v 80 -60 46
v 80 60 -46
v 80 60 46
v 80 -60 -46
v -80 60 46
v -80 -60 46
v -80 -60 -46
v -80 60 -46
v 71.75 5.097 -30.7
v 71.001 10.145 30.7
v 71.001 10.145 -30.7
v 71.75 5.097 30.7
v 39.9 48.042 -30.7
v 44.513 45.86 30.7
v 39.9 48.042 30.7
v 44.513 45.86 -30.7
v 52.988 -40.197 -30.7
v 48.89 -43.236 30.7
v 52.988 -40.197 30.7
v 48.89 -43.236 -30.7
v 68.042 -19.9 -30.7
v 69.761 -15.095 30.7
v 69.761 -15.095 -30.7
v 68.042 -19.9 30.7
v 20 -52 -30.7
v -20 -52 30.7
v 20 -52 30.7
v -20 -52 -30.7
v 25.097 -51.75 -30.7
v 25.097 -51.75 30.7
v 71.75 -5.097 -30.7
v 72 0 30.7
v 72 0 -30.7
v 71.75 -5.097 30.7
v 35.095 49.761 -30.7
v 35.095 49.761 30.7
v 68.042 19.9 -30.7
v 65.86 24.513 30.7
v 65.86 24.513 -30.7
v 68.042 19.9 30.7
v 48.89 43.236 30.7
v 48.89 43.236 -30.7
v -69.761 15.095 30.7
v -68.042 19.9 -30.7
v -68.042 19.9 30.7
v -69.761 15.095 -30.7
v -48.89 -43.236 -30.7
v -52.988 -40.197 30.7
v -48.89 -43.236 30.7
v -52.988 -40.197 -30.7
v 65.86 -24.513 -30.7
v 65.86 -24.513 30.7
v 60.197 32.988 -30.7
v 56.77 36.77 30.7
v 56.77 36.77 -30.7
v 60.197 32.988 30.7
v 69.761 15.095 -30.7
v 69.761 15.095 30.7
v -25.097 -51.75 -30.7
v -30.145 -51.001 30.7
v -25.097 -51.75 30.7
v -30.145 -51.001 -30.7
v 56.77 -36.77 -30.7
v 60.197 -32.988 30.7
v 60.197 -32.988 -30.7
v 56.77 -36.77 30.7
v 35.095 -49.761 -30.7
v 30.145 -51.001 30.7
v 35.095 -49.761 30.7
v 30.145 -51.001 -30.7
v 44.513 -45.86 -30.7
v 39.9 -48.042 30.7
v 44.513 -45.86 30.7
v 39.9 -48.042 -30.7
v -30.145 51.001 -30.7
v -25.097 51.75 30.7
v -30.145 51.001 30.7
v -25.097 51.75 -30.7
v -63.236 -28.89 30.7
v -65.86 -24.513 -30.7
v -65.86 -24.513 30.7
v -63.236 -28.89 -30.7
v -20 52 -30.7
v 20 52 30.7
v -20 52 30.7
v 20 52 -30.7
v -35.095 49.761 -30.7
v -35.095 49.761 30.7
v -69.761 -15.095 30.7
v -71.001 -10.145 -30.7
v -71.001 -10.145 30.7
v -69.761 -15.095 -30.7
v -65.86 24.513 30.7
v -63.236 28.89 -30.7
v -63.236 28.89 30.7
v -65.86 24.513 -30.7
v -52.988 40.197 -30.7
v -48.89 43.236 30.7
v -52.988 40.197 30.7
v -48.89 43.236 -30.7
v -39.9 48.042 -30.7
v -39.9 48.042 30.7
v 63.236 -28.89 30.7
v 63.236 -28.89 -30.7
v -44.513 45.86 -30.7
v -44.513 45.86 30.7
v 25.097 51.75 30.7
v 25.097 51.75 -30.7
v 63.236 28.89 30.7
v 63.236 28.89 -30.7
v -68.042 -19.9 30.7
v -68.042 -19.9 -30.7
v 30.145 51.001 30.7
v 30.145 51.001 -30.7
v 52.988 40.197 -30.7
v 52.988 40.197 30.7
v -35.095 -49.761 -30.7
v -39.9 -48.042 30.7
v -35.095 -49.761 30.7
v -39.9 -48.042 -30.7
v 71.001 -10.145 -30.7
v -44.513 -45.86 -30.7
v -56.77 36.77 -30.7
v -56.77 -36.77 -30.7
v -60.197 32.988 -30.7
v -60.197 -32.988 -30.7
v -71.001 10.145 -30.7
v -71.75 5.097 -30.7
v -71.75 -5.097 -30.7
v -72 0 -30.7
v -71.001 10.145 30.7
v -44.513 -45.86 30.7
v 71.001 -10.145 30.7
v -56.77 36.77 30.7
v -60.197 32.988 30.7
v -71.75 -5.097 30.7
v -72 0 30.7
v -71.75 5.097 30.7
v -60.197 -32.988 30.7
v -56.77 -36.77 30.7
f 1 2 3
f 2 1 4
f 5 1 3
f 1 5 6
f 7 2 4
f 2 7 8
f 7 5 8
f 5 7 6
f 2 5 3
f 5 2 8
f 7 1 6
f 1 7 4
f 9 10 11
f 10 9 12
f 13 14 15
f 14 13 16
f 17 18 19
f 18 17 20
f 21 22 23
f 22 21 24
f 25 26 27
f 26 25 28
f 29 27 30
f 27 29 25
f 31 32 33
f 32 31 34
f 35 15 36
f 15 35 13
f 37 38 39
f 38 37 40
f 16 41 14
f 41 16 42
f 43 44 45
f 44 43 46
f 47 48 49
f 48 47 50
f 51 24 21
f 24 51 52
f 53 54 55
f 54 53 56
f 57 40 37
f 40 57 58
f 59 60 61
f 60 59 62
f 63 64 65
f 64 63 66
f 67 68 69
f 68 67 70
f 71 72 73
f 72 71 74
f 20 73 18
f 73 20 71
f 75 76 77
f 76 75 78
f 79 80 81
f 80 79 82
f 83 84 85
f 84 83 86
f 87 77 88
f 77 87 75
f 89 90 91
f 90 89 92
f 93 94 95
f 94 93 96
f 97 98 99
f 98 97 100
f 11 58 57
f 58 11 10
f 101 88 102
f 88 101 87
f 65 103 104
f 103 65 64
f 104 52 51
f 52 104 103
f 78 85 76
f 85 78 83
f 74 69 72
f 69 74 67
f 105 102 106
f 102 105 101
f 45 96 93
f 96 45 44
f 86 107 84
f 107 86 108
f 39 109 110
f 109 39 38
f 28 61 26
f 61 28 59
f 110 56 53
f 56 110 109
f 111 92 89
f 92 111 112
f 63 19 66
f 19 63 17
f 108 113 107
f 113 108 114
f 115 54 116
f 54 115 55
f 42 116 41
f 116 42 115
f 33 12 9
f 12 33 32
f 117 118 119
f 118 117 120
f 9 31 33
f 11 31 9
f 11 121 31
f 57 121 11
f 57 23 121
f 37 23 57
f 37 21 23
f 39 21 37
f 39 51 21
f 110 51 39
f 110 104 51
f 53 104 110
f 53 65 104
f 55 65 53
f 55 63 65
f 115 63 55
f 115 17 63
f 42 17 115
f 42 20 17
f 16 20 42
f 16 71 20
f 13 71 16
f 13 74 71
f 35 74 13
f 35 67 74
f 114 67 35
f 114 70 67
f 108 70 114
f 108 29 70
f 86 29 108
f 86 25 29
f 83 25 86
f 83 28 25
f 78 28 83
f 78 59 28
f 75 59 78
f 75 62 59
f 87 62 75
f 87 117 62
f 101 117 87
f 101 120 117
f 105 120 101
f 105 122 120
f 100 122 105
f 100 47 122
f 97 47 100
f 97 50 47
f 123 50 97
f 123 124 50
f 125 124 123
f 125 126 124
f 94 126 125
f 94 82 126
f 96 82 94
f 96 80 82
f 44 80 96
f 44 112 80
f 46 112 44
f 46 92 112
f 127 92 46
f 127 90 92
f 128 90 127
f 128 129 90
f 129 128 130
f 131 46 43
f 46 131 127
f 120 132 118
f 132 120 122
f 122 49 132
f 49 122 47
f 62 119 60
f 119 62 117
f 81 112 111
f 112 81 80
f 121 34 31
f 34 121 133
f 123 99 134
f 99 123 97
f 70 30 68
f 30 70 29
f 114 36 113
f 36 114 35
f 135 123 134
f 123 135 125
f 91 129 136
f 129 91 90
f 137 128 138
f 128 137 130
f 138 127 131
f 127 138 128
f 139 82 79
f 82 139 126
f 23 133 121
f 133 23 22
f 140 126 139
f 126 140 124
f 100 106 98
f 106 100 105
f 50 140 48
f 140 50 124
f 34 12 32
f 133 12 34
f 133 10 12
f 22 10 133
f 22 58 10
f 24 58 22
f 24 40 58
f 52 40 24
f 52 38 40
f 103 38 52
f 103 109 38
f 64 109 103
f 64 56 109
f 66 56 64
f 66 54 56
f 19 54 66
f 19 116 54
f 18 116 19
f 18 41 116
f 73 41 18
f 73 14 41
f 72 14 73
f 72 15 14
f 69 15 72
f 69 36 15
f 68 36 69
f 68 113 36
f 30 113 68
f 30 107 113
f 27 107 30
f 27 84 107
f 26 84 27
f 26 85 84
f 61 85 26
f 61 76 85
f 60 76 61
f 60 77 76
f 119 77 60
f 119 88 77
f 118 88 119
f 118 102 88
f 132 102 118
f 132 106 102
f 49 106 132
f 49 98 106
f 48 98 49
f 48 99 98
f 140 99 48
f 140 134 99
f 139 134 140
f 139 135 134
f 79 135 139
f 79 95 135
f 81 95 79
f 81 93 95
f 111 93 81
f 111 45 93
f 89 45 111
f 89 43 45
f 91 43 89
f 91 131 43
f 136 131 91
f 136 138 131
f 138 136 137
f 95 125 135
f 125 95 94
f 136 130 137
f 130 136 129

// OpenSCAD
// ============================================================================
// Atom Lithography Machine — Parametric OpenSCAD Module (S9.1-01)
// ============================================================================
// part_id           : S9.1-01
// parent_bom_id     : S9.1
// subsystem         : S9
// part_name         : Bilinen donor desenli kalibrasyon referans yongalari (5 yonga)
// material          : Si
// temp_stage        : 20 mK - 300 K
// vacuum_grade      : UHV 1e-9 mbar
// tolerance         : Bilinen doz ±2%
// computed_mass_kg  : 1.45000
// envelope_mm       : 188.800 x 136.400 x 92.000
// design_maturity   : M0_M1_DETAILED_CAD_DESIGN_ONLY
// no_lab_measurement: true
// iec61508_certified: false
// semi_s2_certified : false
// Units: millimeters (mm)
// ============================================================================

$fn = 64;

// Nominal bounding envelope parameters (mm)
bbox_x = 188.8000;
bbox_y = 136.4000;
bbox_z = 92.0000;

// Part-specific parametric dimensions
qty_wafers = 5;
wafer_od_mm = 50.0;
case_dx_mm = 160.0;
case_dy_mm = 120.0;

// Interface / port parameters (mm)
port_wafer_carrier_slot_bore = 50.000;

module part_S9_1_01() {
  difference() {
    union() {
      // Cleanroom ESD storage case outer envelope
      cube([160.000, 120.000, 92.000], center=true);
    }
    // Internal padded kit tray cavity
    hull() {
      translate([-20.000, 0, 0]) cylinder(d=104.000, h=61.400, center=true);
      translate([20.000, 0, 0]) cylinder(d=104.000, h=61.400, center=true);
    }
  }
}

// World assembly mounting transform (global machine frame, mm / deg):
// translate([-900.000, -1180.000, 46.000]) rotate([0.000, 0.000, 0.000]) part_S9_1_01();

part_S9_1_01();
